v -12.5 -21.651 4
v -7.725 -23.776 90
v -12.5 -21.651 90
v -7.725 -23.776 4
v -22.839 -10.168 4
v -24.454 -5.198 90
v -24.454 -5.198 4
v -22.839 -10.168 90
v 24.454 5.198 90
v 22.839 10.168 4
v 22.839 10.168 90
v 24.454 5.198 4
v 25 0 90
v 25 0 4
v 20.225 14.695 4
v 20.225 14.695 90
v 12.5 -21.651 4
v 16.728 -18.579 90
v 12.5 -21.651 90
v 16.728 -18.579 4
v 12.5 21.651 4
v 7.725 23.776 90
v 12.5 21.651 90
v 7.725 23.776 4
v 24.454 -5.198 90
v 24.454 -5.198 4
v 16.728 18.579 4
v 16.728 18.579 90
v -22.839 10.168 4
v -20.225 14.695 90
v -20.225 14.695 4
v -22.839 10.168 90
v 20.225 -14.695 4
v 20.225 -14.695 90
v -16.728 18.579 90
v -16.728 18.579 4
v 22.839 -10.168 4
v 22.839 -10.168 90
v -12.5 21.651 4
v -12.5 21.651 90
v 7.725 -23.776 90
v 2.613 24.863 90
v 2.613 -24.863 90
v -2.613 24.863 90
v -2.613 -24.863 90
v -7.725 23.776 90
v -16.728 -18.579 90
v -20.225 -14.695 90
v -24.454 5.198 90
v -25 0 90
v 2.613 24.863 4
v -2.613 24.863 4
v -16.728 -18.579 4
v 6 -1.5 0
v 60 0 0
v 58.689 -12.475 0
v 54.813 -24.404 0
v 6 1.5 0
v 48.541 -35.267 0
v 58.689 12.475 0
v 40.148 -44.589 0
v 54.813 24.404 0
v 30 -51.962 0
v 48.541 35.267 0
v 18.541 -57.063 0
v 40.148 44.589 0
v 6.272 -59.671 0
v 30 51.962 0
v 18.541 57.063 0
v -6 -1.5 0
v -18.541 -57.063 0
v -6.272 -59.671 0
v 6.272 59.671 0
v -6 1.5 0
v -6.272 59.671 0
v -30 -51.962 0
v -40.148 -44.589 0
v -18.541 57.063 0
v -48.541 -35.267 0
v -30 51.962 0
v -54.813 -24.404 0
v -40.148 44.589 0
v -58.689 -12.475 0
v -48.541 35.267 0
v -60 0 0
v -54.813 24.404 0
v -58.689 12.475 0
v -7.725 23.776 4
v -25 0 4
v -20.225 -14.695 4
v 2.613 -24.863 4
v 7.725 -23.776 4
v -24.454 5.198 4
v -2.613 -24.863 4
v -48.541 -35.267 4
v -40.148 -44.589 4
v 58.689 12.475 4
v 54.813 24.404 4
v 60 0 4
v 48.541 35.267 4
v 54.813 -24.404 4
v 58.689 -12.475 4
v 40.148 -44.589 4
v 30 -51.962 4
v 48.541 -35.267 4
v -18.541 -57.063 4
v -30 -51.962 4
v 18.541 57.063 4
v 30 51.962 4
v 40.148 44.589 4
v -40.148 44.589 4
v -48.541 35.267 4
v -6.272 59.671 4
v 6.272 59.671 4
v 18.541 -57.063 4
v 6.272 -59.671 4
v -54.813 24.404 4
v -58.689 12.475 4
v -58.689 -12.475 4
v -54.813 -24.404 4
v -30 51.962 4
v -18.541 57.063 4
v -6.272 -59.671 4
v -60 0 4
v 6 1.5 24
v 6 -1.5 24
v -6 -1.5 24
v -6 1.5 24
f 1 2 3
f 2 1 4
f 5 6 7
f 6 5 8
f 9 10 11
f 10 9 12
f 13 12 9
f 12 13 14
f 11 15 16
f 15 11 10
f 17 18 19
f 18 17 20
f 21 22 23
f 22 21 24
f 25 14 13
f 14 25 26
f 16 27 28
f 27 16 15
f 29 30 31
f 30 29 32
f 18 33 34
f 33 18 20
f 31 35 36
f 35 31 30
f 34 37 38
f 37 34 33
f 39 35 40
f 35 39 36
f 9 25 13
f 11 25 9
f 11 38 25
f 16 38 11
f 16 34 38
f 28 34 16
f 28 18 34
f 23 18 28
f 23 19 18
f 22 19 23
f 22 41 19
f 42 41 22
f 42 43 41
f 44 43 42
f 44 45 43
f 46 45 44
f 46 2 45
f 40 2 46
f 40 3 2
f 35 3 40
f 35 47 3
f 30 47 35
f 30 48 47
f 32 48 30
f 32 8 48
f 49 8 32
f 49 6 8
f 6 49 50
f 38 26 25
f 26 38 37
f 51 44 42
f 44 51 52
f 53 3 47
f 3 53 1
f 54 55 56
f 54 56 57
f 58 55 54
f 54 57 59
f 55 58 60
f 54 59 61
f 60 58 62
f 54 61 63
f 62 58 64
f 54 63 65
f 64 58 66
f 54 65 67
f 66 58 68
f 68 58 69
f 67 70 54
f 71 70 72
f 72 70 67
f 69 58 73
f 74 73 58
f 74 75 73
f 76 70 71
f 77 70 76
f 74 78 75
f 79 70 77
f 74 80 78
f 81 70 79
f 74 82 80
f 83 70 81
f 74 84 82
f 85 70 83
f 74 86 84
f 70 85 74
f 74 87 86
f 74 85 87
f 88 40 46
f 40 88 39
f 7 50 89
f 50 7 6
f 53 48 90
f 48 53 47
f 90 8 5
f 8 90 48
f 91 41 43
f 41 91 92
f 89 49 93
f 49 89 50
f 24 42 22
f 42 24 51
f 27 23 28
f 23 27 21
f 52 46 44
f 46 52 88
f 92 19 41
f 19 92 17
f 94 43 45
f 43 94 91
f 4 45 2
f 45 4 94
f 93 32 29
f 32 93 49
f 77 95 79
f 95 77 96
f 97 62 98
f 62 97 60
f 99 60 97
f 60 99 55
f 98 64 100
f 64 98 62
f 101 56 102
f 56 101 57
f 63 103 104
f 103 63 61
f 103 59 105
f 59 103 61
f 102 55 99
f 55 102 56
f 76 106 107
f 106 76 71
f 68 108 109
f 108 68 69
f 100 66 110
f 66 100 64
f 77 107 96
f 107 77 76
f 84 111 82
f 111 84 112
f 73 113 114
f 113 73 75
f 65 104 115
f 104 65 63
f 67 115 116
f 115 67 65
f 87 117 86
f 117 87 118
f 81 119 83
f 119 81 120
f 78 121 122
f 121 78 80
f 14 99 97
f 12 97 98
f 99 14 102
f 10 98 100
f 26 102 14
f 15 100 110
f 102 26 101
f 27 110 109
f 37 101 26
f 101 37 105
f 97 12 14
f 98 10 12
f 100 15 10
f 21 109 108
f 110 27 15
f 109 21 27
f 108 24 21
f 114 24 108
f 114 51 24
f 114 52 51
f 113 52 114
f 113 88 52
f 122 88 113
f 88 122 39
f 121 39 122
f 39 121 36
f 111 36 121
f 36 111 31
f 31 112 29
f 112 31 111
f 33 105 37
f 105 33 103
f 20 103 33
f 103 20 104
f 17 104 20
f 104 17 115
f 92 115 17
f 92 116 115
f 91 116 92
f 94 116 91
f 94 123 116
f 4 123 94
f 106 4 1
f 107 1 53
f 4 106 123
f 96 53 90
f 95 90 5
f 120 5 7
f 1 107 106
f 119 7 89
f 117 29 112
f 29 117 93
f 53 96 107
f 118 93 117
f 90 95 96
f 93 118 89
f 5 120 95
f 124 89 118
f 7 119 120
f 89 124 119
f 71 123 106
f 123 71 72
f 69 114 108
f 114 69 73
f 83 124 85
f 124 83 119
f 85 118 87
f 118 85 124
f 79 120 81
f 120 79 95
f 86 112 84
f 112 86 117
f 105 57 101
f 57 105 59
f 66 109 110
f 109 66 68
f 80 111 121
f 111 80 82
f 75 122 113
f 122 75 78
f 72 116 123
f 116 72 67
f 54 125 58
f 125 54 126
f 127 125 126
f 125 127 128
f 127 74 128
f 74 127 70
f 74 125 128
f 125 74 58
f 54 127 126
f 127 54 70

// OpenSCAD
// an assistive device from FabLab Shinagawa
// Parametric Spoon Holder

gR = 25; // Grip radial
gH = 90; // Grip length
bR = 60; // Brim radial
bH = 4; // Brim thickness
sX = 12; // Spoon width
sY = 3; // Spoon thickness
sZ = 24; // Spoon slot

// main geometry
difference() {
    union() {
        translate([0, 0, gH/2]) grip();
        translate([0, 0, bH/2]) brim();
        }
    translate([0, 0, sZ/2]) spoon();
    }

// translate([100, 0, sZ/2]) spoon();
module grip() cylinder(r=gR, h=gH, center=true);
module brim() cylinder(r=bR, h=bH, center=true);
module spoon() cube(size = [sX,sY,sZ], center=true);
